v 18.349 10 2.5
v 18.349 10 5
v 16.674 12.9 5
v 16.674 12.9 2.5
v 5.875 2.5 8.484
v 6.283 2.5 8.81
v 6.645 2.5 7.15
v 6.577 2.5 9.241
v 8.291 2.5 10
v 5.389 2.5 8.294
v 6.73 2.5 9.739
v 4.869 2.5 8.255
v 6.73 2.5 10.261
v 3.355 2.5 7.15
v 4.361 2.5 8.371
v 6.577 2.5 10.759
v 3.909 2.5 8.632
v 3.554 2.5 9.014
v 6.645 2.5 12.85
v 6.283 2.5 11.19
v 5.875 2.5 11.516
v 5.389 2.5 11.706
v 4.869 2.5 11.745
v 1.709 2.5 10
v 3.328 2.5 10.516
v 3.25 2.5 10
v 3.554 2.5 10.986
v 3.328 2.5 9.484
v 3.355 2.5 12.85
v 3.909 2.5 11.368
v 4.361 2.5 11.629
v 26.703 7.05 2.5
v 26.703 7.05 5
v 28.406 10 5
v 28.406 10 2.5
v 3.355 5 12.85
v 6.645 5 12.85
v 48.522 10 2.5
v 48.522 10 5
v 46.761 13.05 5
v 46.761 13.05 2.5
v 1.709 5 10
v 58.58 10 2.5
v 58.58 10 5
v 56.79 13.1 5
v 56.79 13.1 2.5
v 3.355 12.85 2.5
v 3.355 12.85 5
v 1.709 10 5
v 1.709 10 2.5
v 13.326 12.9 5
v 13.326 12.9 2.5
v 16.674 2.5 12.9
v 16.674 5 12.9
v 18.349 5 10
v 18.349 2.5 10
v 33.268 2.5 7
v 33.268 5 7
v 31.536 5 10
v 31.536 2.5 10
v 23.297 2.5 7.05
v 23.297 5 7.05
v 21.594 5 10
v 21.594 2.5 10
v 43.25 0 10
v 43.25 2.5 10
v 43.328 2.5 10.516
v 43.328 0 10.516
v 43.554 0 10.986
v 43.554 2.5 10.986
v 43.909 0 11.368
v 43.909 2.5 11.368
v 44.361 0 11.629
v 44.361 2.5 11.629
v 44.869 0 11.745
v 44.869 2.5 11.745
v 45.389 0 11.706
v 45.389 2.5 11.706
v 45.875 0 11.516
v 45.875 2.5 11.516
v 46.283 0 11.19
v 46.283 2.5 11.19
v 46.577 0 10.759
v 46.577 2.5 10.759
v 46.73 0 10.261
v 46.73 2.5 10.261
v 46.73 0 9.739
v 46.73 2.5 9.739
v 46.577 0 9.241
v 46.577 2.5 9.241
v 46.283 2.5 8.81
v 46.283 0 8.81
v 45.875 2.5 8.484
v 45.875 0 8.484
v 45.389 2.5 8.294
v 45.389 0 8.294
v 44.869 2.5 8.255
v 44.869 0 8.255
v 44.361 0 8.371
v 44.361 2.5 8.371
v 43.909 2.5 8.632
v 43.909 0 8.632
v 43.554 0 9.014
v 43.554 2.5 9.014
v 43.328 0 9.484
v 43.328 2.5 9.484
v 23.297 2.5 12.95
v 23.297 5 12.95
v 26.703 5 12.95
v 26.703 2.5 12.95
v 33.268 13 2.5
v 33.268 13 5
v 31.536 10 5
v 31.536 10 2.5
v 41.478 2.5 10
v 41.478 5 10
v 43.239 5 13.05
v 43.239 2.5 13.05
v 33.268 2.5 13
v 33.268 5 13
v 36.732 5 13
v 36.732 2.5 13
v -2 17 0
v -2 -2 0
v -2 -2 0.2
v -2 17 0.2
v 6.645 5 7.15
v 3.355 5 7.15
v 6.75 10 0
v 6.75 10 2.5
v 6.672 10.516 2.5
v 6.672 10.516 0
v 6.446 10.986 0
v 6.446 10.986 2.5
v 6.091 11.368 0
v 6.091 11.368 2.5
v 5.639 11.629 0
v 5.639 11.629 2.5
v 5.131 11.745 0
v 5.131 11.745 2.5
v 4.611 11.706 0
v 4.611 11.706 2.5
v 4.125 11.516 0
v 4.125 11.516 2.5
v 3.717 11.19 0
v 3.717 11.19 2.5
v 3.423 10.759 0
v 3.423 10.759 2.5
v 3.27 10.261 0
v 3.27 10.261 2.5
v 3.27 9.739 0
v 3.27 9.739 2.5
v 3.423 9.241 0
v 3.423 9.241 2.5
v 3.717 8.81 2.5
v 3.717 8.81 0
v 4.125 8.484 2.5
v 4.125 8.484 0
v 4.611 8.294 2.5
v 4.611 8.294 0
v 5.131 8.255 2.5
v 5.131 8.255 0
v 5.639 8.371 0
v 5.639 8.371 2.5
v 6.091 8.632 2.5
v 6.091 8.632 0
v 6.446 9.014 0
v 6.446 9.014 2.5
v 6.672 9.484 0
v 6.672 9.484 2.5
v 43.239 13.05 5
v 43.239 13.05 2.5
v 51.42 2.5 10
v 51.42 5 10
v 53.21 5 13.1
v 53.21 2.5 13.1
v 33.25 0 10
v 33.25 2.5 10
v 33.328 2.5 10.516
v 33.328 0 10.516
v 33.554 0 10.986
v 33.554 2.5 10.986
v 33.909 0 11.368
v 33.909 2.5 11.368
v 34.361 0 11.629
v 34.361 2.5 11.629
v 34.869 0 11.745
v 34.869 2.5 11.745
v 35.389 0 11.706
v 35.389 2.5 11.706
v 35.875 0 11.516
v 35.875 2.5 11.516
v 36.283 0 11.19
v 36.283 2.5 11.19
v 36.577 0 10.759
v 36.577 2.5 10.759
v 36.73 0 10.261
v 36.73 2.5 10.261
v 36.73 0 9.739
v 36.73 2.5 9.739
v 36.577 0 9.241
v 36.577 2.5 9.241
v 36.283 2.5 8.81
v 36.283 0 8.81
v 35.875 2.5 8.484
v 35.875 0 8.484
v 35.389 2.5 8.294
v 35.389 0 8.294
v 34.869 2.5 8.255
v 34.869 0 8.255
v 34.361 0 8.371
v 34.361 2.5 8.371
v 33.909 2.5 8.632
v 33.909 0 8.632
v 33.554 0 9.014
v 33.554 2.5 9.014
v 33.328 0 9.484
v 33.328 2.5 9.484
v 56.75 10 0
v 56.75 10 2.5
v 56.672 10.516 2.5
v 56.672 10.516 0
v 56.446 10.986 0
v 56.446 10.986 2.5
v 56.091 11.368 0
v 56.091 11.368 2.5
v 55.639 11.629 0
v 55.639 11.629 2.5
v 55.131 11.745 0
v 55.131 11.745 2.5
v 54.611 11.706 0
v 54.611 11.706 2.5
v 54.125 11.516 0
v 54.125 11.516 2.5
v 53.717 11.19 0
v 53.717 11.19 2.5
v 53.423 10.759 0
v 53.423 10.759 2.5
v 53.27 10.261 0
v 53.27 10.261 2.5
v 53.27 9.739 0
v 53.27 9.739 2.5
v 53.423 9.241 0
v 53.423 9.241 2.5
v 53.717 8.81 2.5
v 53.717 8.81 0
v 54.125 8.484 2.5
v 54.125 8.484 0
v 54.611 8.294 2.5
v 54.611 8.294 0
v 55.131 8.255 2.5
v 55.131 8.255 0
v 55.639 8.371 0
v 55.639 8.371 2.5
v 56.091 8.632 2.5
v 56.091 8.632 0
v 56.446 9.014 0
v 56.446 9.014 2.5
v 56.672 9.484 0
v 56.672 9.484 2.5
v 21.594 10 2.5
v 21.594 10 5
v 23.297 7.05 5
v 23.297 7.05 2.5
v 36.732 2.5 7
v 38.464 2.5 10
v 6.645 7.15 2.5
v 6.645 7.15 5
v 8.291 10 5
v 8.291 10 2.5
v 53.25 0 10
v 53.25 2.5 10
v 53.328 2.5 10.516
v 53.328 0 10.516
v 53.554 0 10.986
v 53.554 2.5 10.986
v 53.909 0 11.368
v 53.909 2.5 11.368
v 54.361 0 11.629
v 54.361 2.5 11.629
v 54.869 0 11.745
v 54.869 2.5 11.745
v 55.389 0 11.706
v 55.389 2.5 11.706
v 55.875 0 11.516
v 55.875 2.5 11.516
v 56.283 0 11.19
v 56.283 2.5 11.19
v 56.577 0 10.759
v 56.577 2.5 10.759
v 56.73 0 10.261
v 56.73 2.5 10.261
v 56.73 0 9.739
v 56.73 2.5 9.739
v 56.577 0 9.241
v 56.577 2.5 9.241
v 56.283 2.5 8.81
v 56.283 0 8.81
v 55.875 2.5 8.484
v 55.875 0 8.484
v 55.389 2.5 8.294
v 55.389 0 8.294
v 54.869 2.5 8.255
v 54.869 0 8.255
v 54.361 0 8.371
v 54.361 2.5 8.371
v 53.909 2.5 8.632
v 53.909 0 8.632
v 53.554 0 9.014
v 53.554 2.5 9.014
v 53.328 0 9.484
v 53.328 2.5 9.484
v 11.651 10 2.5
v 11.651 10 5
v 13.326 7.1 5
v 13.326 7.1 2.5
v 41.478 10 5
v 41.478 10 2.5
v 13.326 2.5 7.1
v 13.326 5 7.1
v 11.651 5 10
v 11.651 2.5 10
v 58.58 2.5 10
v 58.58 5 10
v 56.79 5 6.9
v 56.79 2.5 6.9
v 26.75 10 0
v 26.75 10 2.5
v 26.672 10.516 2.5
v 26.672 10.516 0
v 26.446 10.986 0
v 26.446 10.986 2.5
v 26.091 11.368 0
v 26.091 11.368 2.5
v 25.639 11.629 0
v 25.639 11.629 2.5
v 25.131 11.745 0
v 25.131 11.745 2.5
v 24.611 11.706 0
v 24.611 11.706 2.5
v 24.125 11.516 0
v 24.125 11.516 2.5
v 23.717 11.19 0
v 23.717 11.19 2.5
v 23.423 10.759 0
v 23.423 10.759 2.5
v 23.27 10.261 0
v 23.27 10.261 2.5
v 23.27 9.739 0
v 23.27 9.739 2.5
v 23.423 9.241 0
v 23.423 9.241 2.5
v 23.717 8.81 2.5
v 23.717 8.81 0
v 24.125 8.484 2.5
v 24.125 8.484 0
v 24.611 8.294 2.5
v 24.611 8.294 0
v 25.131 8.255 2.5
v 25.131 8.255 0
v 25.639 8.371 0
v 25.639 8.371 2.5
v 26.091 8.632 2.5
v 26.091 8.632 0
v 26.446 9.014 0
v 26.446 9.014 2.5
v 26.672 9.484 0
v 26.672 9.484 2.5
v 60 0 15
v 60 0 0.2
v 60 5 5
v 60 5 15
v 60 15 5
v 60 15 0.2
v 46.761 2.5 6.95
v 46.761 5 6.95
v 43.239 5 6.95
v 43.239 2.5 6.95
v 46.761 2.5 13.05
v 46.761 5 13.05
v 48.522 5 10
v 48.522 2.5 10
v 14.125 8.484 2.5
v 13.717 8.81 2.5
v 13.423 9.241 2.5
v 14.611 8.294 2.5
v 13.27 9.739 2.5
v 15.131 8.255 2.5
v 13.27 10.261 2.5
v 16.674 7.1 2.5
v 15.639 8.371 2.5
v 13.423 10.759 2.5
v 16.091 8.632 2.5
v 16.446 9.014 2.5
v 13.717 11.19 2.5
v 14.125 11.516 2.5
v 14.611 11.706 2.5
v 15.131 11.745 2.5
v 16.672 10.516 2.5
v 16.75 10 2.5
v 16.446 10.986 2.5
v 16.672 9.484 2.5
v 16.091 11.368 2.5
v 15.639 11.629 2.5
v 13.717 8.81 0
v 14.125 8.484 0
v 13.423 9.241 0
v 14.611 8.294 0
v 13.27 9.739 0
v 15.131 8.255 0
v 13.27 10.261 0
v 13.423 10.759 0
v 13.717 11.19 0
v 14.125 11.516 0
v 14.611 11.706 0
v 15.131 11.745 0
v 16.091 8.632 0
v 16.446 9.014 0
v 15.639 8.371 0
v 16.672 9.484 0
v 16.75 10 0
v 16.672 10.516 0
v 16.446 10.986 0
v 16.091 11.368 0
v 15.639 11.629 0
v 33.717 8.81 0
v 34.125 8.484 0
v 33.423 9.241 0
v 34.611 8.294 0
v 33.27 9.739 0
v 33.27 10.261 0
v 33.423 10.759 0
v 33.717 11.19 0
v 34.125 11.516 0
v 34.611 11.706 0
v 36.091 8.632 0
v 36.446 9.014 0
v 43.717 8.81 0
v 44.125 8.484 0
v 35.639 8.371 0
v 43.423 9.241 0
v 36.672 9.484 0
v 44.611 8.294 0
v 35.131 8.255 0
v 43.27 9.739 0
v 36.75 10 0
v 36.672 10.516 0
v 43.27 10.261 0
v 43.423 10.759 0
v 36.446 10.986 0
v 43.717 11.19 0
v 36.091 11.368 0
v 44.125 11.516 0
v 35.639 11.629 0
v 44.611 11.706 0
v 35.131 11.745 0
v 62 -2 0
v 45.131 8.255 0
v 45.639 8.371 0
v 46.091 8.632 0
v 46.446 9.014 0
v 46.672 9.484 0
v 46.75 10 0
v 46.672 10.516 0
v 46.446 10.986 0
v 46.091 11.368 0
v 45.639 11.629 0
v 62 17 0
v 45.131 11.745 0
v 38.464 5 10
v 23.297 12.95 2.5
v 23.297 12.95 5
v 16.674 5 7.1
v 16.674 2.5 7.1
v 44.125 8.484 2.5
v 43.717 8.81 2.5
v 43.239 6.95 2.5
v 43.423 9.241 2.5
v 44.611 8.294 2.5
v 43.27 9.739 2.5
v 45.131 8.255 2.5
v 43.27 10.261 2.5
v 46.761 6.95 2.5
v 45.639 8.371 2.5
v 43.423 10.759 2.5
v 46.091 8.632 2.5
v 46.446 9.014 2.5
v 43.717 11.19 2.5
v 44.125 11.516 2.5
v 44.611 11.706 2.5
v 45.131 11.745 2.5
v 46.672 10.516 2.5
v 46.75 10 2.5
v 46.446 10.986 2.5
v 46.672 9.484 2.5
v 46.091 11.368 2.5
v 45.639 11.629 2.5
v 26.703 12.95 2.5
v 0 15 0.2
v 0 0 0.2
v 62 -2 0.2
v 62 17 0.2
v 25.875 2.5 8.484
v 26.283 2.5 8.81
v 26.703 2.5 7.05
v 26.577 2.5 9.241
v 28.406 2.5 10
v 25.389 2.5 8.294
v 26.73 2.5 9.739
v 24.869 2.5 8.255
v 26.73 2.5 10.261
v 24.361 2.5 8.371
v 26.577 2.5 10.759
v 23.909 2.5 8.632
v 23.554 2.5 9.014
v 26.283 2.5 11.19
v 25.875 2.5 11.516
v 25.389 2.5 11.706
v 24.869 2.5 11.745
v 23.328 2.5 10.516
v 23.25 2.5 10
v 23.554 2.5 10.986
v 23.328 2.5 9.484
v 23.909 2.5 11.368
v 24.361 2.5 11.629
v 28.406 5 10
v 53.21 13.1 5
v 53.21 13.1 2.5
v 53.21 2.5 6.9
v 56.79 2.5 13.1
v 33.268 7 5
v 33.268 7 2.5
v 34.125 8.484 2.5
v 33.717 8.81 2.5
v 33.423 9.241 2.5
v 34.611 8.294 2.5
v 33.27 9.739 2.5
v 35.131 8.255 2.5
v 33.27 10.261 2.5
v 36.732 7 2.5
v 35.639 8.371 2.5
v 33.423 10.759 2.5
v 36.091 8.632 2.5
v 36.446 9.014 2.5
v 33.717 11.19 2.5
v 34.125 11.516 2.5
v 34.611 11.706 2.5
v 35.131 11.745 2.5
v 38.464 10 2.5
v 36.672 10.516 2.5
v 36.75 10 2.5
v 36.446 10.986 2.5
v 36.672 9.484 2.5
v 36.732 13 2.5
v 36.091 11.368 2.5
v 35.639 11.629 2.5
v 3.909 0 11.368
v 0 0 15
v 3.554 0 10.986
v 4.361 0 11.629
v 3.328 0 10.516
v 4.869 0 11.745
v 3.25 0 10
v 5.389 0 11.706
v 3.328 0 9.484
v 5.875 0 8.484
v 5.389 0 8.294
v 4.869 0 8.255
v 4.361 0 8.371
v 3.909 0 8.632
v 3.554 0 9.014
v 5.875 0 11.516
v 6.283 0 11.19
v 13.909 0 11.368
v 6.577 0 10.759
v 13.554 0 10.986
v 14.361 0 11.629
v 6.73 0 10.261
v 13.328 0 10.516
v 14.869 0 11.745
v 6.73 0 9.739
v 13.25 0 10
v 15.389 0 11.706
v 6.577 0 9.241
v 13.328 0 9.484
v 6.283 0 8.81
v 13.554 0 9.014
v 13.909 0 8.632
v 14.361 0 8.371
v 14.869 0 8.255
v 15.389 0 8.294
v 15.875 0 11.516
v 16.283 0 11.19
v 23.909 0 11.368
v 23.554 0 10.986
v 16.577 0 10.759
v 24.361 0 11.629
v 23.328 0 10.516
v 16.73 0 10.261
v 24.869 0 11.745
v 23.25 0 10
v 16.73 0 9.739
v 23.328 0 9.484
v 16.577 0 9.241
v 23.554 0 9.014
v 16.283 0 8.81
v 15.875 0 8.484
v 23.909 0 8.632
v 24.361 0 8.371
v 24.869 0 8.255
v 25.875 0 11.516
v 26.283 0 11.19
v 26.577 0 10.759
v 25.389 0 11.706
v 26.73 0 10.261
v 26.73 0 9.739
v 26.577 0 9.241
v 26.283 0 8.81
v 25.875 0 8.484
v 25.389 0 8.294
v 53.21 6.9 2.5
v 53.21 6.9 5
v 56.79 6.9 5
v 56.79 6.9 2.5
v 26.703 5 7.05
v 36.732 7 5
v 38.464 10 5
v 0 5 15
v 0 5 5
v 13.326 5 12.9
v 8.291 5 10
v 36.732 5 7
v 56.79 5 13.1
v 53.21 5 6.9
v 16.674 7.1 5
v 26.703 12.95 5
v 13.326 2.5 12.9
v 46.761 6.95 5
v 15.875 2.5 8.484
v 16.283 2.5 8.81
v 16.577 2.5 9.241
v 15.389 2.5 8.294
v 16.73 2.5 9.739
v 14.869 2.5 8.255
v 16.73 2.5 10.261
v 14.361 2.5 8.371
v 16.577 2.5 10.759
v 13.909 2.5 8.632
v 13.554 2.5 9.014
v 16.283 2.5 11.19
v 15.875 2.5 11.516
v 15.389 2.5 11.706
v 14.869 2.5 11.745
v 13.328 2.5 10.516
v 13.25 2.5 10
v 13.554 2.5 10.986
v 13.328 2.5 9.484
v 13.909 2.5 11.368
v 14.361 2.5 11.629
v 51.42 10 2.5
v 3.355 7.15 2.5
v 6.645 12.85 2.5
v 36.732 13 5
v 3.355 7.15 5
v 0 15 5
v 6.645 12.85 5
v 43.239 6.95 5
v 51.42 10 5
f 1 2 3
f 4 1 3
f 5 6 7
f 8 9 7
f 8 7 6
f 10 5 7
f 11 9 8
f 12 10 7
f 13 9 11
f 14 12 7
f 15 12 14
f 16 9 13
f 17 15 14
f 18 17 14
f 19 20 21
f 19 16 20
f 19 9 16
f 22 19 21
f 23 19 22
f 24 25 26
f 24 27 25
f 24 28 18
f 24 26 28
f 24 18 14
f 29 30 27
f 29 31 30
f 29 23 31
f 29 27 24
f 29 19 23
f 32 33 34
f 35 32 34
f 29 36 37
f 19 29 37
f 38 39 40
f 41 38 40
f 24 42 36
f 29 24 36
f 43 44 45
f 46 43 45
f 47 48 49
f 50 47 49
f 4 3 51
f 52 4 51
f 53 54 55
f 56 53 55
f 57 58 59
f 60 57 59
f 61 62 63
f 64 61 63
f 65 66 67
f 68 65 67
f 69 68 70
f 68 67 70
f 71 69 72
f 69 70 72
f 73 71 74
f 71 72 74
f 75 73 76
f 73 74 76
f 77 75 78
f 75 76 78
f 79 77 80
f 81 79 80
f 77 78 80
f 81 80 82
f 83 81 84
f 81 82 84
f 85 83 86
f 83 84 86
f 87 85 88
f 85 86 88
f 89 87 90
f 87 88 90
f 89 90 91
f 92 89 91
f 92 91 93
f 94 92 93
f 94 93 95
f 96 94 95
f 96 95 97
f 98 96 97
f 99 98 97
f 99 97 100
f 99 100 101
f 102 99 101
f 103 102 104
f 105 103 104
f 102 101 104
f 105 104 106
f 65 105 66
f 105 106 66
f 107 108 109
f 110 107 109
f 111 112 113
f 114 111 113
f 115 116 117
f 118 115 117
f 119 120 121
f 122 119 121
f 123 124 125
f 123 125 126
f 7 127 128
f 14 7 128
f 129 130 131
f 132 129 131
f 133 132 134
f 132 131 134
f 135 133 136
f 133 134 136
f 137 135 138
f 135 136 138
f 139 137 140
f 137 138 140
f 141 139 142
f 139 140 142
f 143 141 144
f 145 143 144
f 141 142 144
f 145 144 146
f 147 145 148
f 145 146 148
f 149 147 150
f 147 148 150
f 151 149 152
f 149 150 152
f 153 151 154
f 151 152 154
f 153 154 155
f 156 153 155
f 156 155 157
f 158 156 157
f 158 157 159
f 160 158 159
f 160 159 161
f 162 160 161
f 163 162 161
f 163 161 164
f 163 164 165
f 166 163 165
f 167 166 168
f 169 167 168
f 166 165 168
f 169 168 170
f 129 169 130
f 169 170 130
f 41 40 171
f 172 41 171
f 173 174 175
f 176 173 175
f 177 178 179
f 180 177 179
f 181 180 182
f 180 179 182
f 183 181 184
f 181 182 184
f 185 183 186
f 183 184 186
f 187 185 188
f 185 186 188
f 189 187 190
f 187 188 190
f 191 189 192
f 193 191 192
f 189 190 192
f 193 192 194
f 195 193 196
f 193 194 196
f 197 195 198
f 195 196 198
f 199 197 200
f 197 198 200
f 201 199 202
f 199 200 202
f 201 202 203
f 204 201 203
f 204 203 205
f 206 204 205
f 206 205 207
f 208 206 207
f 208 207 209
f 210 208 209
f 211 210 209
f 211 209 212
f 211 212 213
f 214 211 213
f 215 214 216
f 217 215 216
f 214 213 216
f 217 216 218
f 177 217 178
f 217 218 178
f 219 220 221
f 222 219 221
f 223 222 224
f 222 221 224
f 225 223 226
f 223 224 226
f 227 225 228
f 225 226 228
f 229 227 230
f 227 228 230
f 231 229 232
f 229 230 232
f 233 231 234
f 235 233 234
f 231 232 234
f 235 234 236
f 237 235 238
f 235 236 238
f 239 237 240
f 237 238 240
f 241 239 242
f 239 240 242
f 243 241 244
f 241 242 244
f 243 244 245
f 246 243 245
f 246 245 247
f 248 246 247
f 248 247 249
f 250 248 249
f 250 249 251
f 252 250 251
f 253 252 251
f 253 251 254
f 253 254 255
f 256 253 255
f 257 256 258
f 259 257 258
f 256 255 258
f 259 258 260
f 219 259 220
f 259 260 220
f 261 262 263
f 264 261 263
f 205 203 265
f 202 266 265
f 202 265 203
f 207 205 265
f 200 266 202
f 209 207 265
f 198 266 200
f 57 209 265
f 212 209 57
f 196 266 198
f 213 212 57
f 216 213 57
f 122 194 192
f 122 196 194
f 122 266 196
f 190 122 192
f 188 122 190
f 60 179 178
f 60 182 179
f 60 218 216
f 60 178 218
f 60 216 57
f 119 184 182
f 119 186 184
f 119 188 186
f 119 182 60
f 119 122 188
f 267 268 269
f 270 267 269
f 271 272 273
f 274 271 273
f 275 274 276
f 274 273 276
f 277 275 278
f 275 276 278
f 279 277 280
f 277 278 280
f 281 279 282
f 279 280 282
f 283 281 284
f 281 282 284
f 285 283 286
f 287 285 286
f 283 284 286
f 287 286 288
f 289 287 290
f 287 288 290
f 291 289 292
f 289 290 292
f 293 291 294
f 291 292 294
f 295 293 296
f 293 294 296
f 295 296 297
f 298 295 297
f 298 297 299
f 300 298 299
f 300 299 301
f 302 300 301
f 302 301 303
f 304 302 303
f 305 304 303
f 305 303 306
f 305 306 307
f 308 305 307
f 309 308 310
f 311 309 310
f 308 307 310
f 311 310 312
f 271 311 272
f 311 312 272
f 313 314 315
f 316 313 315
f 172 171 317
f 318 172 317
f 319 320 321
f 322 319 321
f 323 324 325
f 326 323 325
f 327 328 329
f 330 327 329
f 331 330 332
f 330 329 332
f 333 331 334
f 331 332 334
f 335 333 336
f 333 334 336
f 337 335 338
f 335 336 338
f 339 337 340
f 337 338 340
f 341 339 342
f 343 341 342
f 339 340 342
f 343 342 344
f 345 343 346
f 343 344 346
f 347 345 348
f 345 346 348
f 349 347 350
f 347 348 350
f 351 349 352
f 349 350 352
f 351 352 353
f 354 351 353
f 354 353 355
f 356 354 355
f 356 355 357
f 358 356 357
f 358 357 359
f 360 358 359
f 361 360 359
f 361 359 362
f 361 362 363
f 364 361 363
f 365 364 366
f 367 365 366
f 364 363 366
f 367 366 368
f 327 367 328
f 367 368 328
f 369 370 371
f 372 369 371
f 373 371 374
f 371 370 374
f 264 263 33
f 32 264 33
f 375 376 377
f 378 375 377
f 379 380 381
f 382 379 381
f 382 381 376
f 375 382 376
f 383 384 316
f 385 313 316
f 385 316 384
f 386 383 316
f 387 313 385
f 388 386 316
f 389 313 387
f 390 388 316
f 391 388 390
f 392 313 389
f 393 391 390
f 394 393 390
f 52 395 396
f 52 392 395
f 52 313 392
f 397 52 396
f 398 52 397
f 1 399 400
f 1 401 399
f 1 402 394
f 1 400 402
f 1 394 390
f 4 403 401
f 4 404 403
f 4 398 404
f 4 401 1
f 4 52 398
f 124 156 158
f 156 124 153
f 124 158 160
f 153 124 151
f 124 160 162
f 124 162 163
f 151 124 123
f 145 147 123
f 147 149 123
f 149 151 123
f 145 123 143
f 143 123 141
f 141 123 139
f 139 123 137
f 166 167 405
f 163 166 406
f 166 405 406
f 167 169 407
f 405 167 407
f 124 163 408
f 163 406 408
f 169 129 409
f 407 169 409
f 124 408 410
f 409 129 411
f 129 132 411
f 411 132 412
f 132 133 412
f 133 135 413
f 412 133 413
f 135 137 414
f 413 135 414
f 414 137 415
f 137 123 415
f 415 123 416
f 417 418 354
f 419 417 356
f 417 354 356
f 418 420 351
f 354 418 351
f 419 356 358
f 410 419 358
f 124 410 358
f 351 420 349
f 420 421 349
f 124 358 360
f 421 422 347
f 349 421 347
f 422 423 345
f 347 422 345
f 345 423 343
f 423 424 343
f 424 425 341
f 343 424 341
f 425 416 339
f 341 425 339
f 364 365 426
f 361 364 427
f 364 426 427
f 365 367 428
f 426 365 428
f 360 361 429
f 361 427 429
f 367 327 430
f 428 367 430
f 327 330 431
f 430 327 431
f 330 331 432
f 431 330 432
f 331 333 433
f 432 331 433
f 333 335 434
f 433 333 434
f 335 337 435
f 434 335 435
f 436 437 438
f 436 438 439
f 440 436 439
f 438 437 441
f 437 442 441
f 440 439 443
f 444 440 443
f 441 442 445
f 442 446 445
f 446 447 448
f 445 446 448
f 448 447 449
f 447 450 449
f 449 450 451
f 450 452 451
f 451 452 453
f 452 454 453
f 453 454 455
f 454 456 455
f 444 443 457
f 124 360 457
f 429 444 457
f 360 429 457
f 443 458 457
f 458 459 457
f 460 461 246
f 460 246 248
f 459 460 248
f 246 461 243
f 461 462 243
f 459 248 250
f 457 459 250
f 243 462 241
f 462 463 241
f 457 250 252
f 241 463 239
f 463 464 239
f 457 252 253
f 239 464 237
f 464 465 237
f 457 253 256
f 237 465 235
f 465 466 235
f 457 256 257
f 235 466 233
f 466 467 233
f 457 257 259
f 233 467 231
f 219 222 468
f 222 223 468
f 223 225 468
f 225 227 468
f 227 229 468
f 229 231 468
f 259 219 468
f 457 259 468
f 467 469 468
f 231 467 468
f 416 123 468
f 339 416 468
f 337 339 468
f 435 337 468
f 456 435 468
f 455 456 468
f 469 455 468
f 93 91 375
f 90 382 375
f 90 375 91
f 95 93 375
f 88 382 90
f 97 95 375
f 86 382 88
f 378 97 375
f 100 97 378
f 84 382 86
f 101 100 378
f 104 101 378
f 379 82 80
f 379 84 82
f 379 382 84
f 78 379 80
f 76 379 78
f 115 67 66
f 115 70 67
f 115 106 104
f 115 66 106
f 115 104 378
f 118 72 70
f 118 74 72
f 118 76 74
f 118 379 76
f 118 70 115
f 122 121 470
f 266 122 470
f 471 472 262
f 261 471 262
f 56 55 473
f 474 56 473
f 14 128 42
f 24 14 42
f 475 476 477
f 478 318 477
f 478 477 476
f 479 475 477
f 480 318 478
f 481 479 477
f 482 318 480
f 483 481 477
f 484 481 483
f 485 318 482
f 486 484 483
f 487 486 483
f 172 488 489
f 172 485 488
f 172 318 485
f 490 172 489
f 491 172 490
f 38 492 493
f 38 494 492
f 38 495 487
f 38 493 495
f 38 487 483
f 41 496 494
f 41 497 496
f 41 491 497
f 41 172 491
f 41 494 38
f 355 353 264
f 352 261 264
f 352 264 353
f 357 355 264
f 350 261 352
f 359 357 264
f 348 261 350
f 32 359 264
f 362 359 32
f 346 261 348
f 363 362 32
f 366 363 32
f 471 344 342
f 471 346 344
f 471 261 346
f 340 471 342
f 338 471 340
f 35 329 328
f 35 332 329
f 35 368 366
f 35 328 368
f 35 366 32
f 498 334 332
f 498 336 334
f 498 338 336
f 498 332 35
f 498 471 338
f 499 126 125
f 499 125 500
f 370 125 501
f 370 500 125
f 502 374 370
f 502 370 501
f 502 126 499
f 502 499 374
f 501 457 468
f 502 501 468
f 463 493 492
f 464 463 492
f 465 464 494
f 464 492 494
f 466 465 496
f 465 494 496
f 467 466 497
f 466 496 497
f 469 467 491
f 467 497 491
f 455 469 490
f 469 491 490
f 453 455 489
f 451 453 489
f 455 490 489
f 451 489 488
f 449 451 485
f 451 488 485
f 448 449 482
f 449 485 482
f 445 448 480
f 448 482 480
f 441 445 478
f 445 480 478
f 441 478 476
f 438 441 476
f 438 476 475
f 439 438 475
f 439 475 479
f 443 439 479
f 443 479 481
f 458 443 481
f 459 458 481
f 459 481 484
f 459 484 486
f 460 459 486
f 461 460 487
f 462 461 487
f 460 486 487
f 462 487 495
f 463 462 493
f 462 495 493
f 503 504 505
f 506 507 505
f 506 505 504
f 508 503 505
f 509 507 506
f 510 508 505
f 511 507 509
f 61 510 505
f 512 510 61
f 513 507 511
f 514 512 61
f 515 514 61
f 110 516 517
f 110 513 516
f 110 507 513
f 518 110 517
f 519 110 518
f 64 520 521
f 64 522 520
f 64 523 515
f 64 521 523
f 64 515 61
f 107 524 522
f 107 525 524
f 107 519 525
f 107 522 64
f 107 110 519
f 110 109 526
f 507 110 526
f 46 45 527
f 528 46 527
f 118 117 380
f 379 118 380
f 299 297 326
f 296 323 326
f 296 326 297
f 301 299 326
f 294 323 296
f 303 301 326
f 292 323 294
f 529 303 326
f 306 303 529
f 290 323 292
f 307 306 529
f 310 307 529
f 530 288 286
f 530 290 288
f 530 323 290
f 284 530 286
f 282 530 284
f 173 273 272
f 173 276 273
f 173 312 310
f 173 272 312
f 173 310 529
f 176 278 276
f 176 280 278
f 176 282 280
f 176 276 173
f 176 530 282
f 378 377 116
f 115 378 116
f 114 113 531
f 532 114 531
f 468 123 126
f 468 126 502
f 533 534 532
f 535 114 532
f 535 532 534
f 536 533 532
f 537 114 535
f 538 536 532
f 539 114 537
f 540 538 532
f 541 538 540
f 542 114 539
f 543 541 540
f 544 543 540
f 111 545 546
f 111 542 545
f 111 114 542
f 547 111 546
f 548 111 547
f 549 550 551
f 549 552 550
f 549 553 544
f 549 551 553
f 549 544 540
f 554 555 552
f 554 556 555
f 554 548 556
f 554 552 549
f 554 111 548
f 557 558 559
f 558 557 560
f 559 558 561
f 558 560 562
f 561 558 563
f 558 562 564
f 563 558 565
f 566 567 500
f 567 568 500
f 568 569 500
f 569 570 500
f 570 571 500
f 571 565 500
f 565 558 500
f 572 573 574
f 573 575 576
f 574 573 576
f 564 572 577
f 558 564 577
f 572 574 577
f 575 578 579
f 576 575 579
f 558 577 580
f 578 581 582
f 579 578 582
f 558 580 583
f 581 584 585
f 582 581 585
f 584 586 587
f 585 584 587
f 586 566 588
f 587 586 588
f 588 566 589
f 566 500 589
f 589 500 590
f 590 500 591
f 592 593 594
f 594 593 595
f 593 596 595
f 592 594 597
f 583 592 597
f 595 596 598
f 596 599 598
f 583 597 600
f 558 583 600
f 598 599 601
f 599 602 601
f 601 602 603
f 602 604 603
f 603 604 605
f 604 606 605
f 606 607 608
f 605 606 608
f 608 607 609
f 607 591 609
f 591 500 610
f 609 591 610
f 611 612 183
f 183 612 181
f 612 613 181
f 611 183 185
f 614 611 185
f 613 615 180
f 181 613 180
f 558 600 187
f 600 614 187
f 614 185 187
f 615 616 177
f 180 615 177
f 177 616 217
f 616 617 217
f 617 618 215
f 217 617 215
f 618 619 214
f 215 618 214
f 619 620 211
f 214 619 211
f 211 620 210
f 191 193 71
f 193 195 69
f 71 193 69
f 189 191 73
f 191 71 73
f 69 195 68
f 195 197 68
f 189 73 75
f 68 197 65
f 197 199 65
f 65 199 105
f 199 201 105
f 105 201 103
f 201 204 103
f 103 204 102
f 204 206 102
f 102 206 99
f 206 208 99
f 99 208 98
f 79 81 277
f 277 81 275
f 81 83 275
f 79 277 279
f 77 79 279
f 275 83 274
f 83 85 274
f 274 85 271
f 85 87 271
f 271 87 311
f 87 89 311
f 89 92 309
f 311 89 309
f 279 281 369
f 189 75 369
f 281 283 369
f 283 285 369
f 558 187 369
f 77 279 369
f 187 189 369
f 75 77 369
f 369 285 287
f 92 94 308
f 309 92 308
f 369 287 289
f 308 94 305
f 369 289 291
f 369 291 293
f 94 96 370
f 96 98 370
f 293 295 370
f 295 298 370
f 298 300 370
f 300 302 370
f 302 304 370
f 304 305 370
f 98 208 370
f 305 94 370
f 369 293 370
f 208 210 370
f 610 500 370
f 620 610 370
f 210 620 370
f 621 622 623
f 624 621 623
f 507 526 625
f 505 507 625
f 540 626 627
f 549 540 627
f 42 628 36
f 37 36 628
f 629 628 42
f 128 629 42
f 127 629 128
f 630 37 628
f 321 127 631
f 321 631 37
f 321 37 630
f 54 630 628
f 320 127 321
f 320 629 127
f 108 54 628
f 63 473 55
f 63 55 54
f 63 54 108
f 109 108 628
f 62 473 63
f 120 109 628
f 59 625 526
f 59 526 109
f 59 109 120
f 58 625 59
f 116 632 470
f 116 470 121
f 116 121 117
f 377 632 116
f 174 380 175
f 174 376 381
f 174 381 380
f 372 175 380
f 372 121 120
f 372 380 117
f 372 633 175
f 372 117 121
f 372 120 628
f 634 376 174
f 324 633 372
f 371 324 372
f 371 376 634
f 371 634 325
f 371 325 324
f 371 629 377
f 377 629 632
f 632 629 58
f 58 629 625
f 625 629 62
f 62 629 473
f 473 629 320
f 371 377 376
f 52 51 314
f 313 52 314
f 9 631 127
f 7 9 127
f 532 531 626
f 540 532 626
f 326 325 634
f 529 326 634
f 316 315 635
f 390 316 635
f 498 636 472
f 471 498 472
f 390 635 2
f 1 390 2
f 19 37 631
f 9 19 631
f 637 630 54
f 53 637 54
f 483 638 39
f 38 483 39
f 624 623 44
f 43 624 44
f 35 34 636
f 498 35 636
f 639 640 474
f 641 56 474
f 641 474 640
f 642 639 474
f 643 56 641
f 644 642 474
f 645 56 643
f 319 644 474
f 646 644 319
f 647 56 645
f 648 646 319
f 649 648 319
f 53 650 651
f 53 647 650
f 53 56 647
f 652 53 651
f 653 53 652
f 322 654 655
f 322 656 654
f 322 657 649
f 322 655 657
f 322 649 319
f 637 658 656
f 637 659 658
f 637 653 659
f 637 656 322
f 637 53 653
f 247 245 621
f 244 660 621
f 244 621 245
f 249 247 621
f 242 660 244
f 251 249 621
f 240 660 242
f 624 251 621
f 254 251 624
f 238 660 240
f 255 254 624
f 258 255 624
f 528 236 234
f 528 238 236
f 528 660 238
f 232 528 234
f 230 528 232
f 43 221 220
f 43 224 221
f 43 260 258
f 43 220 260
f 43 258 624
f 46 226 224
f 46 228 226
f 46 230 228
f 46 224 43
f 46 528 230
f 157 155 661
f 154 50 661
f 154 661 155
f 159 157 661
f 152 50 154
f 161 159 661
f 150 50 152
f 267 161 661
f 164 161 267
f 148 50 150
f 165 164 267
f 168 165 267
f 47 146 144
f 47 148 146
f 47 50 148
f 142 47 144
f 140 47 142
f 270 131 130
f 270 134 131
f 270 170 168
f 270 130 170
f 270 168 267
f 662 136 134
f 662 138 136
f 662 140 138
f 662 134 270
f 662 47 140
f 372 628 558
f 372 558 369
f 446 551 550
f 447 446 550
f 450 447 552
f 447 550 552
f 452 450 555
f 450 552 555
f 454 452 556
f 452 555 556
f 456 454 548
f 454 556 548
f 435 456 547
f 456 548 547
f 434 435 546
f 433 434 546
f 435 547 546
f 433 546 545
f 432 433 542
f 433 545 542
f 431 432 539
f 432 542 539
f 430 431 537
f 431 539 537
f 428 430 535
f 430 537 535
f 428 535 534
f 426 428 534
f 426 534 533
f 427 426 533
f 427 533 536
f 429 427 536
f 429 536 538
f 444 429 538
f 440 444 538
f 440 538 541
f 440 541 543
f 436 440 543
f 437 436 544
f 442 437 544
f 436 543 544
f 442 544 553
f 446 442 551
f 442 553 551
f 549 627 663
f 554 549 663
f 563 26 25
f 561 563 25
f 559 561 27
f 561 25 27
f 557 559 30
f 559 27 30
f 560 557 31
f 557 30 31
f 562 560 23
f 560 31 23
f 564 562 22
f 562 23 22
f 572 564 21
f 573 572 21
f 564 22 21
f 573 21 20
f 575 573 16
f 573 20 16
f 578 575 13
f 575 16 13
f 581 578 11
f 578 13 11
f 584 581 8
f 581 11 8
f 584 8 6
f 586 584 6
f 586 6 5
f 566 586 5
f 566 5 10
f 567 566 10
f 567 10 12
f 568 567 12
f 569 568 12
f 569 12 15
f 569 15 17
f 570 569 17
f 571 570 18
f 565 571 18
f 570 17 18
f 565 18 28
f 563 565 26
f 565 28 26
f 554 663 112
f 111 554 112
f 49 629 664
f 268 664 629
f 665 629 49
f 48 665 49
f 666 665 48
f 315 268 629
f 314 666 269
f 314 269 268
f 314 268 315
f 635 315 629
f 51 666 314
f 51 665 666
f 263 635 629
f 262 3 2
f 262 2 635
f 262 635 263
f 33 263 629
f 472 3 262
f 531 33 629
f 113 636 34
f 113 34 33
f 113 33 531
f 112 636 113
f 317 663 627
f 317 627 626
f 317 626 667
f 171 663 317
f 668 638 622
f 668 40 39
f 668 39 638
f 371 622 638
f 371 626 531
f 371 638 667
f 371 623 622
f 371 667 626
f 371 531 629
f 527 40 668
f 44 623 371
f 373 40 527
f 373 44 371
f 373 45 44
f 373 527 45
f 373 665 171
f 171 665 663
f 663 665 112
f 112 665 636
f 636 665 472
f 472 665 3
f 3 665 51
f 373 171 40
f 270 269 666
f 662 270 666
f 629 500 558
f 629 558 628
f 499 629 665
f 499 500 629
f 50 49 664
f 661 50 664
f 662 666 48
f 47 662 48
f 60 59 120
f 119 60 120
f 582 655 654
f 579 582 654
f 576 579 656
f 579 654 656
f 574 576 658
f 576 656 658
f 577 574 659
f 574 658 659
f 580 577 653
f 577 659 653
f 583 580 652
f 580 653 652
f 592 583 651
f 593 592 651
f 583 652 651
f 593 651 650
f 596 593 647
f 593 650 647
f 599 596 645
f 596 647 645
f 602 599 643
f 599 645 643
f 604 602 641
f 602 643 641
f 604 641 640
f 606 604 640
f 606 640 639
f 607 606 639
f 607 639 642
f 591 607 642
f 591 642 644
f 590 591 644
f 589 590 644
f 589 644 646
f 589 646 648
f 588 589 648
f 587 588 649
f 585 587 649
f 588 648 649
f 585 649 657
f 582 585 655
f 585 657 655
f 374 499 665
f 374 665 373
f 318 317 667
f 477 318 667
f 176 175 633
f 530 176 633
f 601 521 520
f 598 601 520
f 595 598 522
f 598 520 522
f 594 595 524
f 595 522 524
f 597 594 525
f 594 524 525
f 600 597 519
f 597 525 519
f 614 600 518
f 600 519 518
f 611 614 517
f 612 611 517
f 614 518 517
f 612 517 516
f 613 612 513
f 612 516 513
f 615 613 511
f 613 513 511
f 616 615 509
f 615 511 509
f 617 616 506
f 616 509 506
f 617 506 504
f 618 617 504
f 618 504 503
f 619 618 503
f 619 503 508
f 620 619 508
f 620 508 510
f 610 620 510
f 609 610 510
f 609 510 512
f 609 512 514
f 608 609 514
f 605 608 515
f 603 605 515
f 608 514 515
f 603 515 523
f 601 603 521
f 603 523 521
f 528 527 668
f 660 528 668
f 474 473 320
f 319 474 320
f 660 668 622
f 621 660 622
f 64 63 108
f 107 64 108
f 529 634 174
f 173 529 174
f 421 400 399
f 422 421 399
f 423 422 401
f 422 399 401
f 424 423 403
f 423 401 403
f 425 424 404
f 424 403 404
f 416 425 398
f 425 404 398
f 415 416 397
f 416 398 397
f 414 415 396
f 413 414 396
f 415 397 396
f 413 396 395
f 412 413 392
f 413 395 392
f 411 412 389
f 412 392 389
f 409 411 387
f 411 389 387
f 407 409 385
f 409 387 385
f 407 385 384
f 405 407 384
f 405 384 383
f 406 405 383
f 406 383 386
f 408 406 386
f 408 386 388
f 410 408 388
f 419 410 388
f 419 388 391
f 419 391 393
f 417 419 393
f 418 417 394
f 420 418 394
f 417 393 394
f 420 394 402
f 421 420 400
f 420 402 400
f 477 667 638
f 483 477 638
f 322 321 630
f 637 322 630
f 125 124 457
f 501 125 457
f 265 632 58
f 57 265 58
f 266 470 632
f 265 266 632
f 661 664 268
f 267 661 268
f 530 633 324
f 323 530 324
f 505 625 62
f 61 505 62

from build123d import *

# Parameters (mm, degrees)
F0_W      = 60
F0_H      = 15
F1_DEPTH  = 5
F2_W      = 60
F2_H      = 5
F3_DEPTH  = 10
F5_DEPTH  = 2.5
F6_R      = 1.75
F7_DEPTH  = 2.5
F9_DEPTH  = 2.5
F10_R     = 1.75
F11_DEPTH = 2.5
F12_W     = 64
F12_H     = 19
F12_W_2   = 60
F12_H_2   = 15
F13_DEPTH = 0.2


with BuildPart() as f1:
    # F0 (on Top) → F1 (new body)
    with BuildSketch(Plane.XY):
        with Locations((30, 7.5)):
            Rectangle(F0_W, F0_H)
    extrude(amount=F1_DEPTH)

    # F2 (on face) → F3 (join)
    with BuildSketch(Plane.XY.offset(5)):
        with Locations((30, 2.5)):
            Rectangle(F2_W, F2_H)
    extrude(amount=F3_DEPTH)

    # F4 (on face) → F5 (cut)
    with BuildSketch(Plane.XY.offset(5)):
        Polygon((8.290897, 10), (6.645448, 12.85), (3.354552, 12.85), (1.709103, 10), (3.354552, 7.15), (6.645448, 7.15), align=None)
        Polygon((18.348632, 10), (16.674316, 12.9), (13.325684, 12.9), (11.651368, 10), (13.325684, 7.1), (16.674316, 7.1), align=None)
        Polygon((28.406367, 10), (26.703183, 12.95), (23.296817, 12.95), (21.593633, 10), (23.296817, 7.05), (26.703183, 7.05), align=None)
        Polygon((38.464102, 10), (36.732051, 13), (33.267949, 13), (31.535898, 10), (33.267949, 7), (36.732051, 7), align=None)
        Polygon((46.760918, 13.05), (43.239082, 13.05), (41.478163, 10), (43.239082, 6.95), (46.760918, 6.95), (48.521837, 10), align=None)
        Polygon((58.579572, 10), (56.789786, 13.1), (53.210214, 13.1), (51.420428, 10), (53.210214, 6.9), (56.789786, 6.9), align=None)
    extrude(amount=-F5_DEPTH, mode=Mode.SUBTRACT)

    # F6 (on face) → F7 (cut, through all)
    with BuildSketch(Plane.XY.offset(2.5)):
        with Locations((5, 10)):
            Circle(F6_R)
        with Locations((15, 10)):
            Circle(F6_R)
        with Locations((25, 10)):
            Circle(F6_R)
        with Locations((35, 10)):
            Circle(F6_R)
        with Locations((45, 10)):
            Circle(F6_R)
        with Locations((55, 10)):
            Circle(F6_R)
    extrude(amount=-F7_DEPTH, mode=Mode.SUBTRACT)

    # F8 (on face) → F9 (cut)
    with BuildSketch(Plane(origin=(0, 5, 0), x_dir=(-1, 0, 0), z_dir=(0, 1, 0))):
        Polygon((-51.420428, 10), (-53.210214, 13.1), (-56.789786, 13.1), (-58.579572, 10), (-56.789786, 6.9), (-53.210214, 6.9), align=None)
        Polygon((-43.239082, 13.05), (-46.760918, 13.05), (-48.521837, 10), (-46.760918, 6.95), (-43.239082, 6.95), (-41.478163, 10), align=None)
        Polygon((-33.267949, 13), (-36.732051, 13), (-38.464102, 10), (-36.732051, 7), (-33.267949, 7), (-31.535898, 10), align=None)
        Polygon((-23.296817, 12.95), (-26.703183, 12.95), (-28.406367, 10), (-26.703183, 7.05), (-23.296817, 7.05), (-21.593633, 10), align=None)
        Polygon((-13.325684, 12.9), (-16.674316, 12.9), (-18.348632, 10), (-16.674316, 7.1), (-13.325684, 7.1), (-11.651368, 10), align=None)
        Polygon((-1.709103, 10), (-3.354552, 12.85), (-6.645448, 12.85), (-8.290897, 10), (-6.645448, 7.15), (-3.354552, 7.15), align=None)
    extrude(amount=-F9_DEPTH, mode=Mode.SUBTRACT)

    # F10 (on face) → F11 (cut, through all)
    with BuildSketch(Plane(origin=(0, 2.5, 0), x_dir=(-1, 0, 0), z_dir=(0, 1, 0))):
        with Locations((-55, 10)):
            Circle(F10_R)
        with Locations((-45, 10)):
            Circle(F10_R)
        with Locations((-35, 10)):
            Circle(F10_R)
        with Locations((-25, 10)):
            Circle(F10_R)
        with Locations((-15, 10)):
            Circle(F10_R)
        with Locations((-5, 10)):
            Circle(F10_R)
    extrude(amount=-F11_DEPTH, mode=Mode.SUBTRACT)

    # F12 (on Top) → F13 (join)
    with BuildSketch(Plane.XY):
        with Locations((30, 7.5)):
            Rectangle(F12_W, F12_H)
        with Locations((30, 7.5)):
            Rectangle(F12_W_2, F12_H_2, mode=Mode.SUBTRACT)
    extrude(amount=F13_DEPTH)


solid = f1.part
